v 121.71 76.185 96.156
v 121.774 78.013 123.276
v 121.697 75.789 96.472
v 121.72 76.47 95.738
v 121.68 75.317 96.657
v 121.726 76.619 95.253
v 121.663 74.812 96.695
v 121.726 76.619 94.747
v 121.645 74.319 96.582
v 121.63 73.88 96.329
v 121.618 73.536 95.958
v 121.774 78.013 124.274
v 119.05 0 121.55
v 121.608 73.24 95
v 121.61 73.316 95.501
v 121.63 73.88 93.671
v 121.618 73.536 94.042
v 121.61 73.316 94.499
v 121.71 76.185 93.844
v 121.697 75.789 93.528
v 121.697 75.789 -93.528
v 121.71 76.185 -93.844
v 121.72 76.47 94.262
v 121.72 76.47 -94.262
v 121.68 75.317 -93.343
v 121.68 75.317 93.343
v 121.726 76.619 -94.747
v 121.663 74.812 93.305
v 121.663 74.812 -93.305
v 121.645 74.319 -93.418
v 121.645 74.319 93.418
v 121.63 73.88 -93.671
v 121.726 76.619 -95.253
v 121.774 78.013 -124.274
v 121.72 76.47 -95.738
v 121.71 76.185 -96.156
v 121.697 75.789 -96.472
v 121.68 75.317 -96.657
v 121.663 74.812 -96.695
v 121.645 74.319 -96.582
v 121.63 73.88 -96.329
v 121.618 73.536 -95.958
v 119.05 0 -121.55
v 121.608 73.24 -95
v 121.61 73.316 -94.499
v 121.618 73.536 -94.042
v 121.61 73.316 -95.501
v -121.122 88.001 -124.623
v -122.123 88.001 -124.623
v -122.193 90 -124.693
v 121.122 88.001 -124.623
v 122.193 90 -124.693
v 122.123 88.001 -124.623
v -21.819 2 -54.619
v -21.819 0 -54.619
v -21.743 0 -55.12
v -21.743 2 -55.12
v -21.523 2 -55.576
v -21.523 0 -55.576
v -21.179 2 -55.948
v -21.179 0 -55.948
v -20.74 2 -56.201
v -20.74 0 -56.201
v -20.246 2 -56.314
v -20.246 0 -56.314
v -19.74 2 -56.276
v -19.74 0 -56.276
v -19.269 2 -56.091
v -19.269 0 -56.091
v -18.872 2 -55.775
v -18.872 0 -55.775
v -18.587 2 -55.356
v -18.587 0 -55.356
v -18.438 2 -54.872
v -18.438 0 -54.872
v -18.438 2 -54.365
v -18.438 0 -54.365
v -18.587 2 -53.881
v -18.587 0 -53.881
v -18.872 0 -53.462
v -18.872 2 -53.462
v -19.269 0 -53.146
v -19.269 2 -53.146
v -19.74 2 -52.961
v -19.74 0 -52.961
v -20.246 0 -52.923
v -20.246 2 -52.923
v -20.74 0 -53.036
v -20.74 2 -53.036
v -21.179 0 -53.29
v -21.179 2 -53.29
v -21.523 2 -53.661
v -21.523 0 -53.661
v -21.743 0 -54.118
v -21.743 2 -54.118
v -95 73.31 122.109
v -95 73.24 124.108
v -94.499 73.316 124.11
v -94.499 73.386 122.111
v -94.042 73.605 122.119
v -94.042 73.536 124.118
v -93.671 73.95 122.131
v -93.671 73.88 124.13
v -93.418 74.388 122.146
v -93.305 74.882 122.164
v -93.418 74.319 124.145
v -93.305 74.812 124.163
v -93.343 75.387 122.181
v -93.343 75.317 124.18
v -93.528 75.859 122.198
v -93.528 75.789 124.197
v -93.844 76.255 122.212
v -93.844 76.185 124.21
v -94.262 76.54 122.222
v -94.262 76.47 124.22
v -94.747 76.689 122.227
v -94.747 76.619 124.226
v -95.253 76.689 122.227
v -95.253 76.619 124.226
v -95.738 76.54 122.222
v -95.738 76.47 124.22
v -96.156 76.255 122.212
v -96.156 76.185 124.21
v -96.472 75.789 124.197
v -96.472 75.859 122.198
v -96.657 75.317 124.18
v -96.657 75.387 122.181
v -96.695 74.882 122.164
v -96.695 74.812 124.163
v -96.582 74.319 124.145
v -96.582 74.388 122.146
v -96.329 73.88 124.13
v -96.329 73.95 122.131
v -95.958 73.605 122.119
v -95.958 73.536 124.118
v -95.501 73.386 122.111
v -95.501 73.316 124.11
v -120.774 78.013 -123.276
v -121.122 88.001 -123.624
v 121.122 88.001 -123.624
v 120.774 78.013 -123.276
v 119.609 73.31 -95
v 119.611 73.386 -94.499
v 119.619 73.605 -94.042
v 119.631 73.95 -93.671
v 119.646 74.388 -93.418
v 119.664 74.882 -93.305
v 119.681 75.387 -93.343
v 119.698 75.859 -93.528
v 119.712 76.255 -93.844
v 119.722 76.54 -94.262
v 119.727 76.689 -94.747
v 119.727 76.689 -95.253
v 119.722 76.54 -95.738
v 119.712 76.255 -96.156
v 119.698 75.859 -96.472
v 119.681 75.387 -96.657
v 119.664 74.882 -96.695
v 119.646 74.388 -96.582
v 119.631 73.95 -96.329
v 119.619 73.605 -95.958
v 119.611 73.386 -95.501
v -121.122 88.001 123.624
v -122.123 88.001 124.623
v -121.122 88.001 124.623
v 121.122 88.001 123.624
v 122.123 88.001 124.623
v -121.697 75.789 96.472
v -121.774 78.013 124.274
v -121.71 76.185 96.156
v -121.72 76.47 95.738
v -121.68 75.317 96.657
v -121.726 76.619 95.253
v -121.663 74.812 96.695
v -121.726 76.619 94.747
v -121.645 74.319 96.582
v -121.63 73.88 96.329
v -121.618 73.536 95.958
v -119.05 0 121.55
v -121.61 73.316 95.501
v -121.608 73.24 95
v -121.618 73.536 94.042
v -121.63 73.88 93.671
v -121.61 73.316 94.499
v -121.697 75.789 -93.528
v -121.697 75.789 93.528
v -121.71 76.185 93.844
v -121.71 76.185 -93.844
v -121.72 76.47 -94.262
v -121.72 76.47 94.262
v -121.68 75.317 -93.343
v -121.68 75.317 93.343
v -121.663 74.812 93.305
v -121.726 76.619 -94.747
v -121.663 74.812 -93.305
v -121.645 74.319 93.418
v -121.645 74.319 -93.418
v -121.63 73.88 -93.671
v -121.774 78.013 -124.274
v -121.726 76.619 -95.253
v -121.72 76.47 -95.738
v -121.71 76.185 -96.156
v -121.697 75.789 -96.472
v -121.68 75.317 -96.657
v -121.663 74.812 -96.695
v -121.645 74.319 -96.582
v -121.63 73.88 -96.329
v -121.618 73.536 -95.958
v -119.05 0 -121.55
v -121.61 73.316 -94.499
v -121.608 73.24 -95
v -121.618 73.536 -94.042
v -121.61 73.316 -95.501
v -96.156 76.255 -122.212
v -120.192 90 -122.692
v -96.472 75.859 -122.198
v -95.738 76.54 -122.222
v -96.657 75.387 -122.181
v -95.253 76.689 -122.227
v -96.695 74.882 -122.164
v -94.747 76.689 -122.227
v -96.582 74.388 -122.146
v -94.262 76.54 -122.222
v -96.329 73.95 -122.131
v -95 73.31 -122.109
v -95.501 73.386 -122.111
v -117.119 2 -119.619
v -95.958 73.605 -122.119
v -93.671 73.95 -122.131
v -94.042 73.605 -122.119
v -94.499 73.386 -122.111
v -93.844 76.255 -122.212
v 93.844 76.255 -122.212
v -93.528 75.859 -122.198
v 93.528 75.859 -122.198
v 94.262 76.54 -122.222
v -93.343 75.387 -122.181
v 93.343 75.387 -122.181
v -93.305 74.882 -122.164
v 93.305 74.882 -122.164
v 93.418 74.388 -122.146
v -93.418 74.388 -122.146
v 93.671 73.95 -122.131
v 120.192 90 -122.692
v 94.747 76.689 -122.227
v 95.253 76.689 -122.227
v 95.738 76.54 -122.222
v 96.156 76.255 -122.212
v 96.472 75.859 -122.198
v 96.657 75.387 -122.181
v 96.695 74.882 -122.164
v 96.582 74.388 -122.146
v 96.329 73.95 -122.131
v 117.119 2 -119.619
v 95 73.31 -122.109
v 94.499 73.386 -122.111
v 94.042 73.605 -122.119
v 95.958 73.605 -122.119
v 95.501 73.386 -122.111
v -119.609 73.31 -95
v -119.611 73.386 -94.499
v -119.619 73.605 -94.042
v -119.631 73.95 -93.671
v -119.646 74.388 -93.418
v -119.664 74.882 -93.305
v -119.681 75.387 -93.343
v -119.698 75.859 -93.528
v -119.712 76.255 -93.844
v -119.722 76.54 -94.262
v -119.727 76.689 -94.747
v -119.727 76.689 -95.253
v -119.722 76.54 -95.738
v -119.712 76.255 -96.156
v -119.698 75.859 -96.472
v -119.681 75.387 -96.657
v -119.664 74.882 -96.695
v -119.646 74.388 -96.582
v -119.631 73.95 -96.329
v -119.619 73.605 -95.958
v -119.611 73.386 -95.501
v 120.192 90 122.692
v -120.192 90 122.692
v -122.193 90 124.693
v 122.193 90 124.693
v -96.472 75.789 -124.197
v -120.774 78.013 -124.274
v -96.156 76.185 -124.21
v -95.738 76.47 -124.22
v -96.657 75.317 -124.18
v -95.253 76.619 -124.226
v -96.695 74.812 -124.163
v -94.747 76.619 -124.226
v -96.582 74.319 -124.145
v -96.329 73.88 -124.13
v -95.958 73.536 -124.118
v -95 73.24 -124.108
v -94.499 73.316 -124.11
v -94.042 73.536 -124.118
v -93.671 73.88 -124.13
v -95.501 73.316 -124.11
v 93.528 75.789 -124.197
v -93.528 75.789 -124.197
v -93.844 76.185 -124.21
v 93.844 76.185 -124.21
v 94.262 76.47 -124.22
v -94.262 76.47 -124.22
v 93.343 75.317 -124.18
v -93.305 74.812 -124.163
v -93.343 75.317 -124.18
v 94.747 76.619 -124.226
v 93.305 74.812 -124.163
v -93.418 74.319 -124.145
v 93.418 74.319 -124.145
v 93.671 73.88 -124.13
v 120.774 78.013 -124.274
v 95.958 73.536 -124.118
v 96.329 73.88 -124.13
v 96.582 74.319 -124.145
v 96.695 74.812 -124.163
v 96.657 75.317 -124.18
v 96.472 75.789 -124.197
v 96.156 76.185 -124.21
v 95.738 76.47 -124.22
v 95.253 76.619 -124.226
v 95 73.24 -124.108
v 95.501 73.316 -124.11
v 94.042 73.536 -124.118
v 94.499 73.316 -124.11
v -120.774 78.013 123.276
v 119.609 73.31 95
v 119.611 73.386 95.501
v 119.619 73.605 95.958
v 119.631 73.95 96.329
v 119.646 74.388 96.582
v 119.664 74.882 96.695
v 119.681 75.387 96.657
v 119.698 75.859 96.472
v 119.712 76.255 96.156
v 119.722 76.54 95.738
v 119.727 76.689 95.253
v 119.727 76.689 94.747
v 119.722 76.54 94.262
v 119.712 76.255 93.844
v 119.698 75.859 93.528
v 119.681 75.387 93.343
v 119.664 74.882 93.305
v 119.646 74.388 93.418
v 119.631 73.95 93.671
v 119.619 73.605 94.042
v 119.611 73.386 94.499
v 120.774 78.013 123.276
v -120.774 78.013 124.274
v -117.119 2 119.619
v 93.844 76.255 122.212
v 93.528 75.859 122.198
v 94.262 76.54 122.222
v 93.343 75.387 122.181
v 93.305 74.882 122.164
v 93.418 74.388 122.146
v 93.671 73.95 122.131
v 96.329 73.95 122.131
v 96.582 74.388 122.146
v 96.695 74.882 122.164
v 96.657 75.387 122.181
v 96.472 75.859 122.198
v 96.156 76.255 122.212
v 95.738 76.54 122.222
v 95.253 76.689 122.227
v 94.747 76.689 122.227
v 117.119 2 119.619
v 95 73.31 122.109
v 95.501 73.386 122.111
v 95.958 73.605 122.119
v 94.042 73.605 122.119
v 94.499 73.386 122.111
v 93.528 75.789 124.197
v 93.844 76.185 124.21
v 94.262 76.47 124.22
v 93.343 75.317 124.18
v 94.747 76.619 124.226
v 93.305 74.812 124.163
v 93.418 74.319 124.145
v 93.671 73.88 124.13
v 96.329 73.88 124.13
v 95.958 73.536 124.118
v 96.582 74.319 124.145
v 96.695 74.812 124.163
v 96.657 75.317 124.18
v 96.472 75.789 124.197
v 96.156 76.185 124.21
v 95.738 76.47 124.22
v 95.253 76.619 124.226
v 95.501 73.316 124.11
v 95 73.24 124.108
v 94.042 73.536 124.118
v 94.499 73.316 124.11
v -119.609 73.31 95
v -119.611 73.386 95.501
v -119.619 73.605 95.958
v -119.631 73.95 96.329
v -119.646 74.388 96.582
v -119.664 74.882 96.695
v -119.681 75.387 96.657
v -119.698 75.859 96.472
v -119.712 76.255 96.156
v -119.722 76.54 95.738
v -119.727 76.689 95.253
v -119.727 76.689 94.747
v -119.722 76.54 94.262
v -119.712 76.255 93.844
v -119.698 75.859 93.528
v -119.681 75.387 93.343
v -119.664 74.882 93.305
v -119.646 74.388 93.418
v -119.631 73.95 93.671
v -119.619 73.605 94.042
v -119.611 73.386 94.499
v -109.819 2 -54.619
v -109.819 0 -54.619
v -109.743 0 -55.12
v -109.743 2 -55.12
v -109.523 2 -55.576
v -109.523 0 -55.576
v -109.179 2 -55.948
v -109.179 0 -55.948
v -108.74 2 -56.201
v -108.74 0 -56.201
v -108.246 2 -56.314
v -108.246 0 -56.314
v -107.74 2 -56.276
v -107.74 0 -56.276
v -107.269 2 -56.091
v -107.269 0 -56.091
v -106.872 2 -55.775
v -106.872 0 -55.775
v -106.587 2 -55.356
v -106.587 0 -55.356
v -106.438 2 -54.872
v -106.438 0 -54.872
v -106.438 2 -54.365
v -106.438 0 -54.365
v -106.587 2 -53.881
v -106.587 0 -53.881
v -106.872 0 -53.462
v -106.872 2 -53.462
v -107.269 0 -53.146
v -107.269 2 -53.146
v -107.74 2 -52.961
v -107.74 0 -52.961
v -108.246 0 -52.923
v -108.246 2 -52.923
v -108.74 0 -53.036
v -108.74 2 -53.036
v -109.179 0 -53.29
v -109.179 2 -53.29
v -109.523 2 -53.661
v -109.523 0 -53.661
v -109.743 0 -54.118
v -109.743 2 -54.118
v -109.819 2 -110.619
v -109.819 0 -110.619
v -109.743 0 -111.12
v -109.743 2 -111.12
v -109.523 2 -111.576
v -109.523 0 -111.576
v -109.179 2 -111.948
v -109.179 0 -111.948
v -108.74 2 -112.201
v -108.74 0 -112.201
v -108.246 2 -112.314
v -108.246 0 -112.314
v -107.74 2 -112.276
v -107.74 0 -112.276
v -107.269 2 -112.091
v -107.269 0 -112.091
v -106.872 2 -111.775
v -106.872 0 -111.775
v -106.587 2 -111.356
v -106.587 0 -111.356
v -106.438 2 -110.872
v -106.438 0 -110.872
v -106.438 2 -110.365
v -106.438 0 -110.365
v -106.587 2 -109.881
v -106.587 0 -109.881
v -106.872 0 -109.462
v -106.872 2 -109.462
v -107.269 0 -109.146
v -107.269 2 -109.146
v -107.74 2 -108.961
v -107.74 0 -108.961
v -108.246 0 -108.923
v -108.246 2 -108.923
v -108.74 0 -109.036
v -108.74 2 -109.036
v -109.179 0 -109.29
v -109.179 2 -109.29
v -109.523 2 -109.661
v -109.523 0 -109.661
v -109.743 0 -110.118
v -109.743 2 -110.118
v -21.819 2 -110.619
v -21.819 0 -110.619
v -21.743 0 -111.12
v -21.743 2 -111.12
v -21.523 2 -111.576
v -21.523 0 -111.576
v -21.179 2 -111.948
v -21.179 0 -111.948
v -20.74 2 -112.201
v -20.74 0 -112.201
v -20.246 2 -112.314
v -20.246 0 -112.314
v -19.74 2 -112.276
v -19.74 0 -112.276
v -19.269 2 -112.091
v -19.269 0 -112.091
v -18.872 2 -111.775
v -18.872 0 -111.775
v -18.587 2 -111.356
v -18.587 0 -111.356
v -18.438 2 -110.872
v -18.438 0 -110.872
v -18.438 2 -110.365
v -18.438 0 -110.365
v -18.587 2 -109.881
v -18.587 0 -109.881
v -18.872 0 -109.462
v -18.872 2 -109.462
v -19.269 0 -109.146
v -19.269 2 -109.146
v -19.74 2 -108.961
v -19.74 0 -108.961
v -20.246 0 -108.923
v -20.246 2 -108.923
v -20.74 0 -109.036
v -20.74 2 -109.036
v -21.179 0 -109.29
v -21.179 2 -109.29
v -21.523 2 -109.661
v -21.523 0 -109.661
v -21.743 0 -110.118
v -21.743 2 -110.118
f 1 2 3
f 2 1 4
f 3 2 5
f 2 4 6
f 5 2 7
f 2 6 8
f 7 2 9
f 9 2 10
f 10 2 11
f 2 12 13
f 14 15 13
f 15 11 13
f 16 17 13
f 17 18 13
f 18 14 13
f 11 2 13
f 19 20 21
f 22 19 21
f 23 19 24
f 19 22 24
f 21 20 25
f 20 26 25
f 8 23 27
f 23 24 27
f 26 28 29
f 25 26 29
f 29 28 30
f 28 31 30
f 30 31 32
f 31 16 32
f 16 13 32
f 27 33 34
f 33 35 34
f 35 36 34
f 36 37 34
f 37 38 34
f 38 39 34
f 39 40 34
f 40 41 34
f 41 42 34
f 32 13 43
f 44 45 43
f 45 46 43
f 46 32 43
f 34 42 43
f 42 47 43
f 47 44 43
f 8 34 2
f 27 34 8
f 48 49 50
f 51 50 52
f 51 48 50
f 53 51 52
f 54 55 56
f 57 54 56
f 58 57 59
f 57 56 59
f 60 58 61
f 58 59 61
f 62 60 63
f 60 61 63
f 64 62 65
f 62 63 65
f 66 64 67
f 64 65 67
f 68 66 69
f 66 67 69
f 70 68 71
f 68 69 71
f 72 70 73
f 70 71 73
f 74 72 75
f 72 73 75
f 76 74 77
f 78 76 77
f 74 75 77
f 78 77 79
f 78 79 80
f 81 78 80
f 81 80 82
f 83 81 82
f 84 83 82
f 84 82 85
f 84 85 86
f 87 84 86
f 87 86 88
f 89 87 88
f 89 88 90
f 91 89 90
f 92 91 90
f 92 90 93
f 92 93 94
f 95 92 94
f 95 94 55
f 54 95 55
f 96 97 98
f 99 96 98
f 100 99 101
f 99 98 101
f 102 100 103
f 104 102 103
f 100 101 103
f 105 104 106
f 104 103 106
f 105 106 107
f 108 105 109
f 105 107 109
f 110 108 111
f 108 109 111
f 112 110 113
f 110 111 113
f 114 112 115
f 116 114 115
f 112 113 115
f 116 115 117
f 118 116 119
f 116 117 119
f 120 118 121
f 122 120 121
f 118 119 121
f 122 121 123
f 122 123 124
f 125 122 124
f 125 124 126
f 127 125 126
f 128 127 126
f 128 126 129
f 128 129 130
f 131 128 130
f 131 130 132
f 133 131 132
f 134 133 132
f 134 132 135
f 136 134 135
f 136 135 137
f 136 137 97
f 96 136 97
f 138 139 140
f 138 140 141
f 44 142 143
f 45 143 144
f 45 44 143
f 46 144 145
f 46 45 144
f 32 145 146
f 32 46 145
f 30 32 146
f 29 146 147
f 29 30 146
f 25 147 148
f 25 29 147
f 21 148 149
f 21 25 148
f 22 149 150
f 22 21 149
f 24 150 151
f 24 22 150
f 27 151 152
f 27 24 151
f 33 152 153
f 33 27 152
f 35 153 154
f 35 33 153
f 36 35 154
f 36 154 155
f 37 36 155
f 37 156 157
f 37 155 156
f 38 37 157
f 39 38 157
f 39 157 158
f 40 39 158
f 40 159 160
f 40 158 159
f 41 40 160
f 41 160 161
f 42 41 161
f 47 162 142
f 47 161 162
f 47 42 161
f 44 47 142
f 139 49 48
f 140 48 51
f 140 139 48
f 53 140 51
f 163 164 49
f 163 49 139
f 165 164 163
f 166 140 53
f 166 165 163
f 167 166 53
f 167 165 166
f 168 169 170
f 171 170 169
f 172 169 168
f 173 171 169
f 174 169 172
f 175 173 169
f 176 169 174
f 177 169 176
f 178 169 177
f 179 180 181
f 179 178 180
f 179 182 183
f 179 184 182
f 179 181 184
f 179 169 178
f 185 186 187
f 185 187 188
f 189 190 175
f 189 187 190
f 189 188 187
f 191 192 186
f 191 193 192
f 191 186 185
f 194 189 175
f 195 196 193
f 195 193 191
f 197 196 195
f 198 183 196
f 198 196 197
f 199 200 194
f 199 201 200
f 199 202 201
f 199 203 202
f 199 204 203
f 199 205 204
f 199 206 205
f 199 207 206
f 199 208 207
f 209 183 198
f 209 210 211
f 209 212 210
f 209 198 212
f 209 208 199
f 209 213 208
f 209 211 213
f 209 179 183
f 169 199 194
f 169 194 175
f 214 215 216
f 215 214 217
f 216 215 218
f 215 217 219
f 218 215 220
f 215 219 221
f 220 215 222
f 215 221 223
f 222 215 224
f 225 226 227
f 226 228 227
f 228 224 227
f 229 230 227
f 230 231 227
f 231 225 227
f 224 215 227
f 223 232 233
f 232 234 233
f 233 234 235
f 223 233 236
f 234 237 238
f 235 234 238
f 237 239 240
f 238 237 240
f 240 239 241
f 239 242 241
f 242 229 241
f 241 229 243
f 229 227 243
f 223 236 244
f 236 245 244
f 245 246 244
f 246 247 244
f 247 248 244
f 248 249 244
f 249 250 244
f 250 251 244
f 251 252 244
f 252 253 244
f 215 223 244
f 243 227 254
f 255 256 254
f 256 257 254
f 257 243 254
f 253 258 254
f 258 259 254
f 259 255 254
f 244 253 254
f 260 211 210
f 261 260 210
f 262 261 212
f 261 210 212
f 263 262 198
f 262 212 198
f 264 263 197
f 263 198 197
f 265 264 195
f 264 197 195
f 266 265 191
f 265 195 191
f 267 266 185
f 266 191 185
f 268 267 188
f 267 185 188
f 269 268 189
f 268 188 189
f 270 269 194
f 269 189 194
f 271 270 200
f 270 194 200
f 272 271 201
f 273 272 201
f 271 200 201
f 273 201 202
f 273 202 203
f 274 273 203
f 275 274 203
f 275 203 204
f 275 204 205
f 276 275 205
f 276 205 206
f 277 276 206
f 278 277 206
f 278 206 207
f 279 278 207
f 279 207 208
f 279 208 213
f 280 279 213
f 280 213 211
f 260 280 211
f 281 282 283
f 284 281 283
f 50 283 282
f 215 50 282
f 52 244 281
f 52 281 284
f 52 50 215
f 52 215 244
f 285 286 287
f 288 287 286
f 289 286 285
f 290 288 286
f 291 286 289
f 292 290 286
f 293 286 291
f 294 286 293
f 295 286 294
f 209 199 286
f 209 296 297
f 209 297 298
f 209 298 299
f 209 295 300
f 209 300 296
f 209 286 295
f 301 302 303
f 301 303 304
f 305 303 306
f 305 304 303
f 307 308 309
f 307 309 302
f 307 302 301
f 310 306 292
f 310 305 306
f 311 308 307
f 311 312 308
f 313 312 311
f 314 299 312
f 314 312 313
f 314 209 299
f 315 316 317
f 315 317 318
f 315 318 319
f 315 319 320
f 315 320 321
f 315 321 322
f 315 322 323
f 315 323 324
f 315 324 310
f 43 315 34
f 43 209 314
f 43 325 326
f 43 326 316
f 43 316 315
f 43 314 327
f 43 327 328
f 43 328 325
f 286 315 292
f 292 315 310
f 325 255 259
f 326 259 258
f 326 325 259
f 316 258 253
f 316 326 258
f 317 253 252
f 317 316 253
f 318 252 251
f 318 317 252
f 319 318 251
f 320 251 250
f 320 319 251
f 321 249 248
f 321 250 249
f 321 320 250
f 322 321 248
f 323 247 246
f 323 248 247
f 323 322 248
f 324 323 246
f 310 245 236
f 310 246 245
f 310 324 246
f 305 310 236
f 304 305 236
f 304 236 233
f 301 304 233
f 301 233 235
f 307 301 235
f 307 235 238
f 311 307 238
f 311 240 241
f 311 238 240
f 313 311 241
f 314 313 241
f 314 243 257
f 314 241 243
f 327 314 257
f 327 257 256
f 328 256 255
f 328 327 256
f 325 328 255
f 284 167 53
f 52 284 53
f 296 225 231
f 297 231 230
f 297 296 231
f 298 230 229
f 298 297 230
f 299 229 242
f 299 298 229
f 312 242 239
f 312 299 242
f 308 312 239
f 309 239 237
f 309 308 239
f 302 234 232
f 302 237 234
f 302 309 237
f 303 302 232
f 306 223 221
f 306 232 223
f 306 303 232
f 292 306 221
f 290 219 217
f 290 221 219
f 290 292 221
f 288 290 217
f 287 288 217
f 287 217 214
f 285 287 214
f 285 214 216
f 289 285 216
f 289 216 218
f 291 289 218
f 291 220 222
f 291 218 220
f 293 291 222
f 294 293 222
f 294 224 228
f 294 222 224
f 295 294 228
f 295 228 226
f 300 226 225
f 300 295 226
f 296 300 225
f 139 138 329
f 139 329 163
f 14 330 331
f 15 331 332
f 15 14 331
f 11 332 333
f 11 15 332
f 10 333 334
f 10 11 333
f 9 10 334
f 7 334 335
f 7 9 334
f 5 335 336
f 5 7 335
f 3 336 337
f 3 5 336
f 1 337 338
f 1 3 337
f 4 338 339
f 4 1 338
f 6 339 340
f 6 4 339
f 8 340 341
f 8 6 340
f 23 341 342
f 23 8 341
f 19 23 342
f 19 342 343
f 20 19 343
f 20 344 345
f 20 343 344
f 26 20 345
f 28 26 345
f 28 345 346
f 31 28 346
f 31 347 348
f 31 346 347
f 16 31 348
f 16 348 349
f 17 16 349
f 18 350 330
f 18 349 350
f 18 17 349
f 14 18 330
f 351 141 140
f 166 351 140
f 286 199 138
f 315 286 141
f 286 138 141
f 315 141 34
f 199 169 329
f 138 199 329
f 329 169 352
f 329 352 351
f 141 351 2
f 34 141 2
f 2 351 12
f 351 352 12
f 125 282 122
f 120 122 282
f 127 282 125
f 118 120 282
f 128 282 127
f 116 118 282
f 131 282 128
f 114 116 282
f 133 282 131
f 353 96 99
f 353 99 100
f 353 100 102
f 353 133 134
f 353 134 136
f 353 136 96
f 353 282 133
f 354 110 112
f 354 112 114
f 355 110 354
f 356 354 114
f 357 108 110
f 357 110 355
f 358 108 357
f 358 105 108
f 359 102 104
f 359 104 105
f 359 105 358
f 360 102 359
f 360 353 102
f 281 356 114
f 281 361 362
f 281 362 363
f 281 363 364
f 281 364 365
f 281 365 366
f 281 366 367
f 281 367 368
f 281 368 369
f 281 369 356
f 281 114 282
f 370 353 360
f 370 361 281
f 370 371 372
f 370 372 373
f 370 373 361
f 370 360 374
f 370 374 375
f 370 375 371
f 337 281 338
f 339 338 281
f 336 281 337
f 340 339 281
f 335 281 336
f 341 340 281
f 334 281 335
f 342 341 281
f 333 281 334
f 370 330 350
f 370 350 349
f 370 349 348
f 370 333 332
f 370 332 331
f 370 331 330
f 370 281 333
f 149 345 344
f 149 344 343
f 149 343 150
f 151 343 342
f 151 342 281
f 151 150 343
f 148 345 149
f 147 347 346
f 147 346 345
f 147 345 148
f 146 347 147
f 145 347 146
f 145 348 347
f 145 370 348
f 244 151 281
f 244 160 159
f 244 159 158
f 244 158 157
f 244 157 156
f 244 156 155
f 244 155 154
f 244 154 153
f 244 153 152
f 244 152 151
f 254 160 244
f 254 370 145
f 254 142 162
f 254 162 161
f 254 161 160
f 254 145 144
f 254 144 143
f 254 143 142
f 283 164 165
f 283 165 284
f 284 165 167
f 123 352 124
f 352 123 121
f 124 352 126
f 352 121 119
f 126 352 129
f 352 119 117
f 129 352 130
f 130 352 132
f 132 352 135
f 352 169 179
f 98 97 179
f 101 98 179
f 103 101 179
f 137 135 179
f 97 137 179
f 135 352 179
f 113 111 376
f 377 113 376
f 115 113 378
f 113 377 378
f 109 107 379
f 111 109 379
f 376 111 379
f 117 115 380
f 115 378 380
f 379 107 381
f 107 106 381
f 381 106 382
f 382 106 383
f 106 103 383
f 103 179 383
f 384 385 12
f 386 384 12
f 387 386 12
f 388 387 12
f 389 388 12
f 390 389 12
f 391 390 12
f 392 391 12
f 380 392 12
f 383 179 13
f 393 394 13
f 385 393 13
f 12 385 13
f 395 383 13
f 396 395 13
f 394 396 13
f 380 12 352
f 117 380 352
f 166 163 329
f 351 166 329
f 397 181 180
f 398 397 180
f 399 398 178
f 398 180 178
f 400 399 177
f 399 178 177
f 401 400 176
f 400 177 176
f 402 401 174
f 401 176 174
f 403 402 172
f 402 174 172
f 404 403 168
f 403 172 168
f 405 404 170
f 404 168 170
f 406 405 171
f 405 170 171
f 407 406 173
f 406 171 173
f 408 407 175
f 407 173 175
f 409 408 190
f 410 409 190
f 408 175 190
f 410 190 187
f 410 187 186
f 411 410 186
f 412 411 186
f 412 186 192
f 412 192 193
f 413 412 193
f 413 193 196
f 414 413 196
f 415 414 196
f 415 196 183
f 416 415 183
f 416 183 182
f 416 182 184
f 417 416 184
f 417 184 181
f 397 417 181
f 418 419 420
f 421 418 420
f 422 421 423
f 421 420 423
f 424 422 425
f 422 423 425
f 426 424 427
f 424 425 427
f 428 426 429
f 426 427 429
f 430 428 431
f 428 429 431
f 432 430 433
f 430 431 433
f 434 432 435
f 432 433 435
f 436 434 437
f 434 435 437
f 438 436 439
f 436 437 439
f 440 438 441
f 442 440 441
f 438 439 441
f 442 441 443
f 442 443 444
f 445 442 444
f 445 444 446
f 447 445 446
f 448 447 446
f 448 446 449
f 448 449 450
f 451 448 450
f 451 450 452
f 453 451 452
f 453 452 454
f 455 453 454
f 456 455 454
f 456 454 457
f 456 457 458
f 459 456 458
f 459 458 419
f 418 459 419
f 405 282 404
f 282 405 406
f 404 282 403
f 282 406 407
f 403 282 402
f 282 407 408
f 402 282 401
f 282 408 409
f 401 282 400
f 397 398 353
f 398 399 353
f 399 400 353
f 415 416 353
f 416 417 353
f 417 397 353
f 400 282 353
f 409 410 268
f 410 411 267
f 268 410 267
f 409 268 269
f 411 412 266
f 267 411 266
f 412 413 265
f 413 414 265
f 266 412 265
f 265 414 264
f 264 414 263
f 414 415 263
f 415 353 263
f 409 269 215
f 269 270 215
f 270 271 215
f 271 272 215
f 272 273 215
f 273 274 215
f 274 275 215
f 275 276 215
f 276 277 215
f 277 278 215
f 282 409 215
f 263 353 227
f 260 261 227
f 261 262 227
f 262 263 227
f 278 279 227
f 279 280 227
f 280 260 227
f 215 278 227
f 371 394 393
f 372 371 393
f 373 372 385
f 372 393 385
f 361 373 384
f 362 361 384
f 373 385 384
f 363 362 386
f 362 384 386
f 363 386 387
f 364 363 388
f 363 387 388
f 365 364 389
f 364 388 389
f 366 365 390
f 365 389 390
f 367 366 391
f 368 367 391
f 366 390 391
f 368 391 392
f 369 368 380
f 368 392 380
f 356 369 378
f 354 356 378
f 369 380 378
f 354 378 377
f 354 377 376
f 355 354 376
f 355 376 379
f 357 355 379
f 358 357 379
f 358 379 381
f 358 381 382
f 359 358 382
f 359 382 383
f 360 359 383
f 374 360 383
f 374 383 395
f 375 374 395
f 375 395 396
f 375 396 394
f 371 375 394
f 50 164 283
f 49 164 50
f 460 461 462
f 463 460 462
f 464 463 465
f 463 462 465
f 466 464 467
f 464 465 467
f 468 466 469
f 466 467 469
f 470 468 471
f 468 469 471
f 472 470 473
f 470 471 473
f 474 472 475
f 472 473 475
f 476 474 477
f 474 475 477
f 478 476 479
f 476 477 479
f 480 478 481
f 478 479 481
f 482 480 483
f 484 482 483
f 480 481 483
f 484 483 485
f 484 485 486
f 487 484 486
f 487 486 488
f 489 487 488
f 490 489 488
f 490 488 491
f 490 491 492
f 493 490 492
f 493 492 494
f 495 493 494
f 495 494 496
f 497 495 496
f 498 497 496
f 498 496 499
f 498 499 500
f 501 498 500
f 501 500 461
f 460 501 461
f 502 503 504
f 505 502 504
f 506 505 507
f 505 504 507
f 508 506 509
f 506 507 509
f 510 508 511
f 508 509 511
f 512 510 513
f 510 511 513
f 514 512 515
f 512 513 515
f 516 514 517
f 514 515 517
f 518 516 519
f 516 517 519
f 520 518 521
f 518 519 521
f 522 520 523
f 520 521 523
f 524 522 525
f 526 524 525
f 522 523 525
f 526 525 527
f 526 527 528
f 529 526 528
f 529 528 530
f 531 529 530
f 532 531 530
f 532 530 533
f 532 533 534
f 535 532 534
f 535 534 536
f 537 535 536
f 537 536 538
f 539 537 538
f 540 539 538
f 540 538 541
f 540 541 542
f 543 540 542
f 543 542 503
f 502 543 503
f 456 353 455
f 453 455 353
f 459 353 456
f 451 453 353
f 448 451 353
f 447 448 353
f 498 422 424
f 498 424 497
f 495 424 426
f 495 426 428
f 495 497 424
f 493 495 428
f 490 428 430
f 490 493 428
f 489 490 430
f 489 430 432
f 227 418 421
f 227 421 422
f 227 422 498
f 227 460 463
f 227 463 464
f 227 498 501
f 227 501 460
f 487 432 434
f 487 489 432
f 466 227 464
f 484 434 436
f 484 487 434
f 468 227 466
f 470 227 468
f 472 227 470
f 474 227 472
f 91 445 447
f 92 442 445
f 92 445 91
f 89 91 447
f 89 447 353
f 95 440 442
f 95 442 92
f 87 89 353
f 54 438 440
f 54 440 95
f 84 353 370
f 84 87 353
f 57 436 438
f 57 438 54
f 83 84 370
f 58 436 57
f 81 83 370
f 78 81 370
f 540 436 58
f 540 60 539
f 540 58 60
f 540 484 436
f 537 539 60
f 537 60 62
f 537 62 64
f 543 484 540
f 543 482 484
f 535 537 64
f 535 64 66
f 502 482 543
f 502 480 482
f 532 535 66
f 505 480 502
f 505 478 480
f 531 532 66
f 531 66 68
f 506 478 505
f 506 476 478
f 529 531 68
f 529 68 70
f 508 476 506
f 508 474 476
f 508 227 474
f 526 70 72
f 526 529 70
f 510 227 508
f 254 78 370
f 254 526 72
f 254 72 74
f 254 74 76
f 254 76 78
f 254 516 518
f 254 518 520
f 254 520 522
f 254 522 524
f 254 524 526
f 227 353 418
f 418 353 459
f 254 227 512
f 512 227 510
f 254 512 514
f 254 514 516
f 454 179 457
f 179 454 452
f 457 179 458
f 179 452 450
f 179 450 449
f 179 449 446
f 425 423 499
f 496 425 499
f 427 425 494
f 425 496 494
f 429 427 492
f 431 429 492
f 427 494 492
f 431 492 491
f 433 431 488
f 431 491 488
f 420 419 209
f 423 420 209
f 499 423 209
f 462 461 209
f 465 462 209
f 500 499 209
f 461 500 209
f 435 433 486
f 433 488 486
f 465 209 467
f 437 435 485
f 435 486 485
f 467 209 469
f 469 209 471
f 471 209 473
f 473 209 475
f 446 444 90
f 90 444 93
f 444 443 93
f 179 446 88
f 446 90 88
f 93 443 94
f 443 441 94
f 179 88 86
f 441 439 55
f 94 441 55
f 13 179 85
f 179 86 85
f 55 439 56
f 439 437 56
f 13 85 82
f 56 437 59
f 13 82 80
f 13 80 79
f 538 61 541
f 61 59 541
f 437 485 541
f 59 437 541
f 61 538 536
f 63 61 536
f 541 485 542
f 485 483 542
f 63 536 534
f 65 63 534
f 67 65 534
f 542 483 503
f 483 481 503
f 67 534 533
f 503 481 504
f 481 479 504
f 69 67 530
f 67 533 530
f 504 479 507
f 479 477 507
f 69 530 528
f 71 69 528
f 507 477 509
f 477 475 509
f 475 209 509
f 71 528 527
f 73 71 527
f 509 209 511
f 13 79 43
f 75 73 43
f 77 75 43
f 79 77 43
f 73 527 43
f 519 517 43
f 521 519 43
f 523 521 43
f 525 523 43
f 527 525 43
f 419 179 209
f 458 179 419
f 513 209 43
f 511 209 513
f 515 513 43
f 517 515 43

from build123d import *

# Parameters (mm, degrees)
SKETCH1_W            = 238.1
SKETCH1_H            = 243.1
BOSS_EXTRUDE1_DEPTH  = 90
BOSS_EXTRUDE1_DRAFT  = -2
SHELL1_T             = -2
CUT_EXTRUDE7_DEPTH   = 291.651130828
CUT_EXTRUDE8_DEPTH   = 288.475472497
SKETCH10_R           = 1.7
CUT_EXTRUDE11_DEPTH  = 3
SKETCH11_R           = 1.7
CUT_EXTRUDE12_DEPTH  = 3
M3_CLEARANCE_HOLE2_D = 3.4


with BuildPart() as part:
    # Sketch1 → Boss-Extrude1 (with draft: the straight prism first)
    with BuildSketch(Plane(origin=(0, 0, 0), x_dir=(1, 0, 0), z_dir=(0, 1, 0))):
        Rectangle(SKETCH1_W, SKETCH1_H)
    extrude(amount=BOSS_EXTRUDE1_DEPTH)
    # Boss-Extrude1: the draft: its side faces are tilted about the plane it starts from
    boss_extrude1_sides = [part.faces().sort_by_distance(p)[0] for p in [
        (0, 45, 121.55),
        (119.05, 45, 0),
        (0, 45, -121.55),
        (-119.05, 45, 0),
    ]]
    draft(boss_extrude1_sides, Plane(origin=(0, 0, 0), x_dir=(1, 0, 0), z_dir=(0, 1, 0)), BOSS_EXTRUDE1_DRAFT)

    # Shell1
    shell1_openings = [part.faces().sort_by_distance(p)[0] for p in [
        (0, 90, 0),
    ]]
    offset(amount=SHELL1_T, openings=shell1_openings, kind=Kind.INTERSECTION)

    # Sketch6 → Cut-Extrude7 (cut, through all, along a direction that is not the sketch's normal)
    with BuildSketch(Plane(origin=(0, -4.239449692, 121.401955155), x_dir=(1, 0, 0), z_dir=(0, -0.03489949670250105, 0.9993908270190958))):
        Polygon((-122.123070261, 92.296892811), (-121.774287633, 82.302977128), (-120.773678831, 82.302977128), (-121.122461459, 92.296892811), align=None)
    cut_extrude7 = extrude(amount=-CUT_EXTRUDE7_DEPTH, dir=(0, 0, 1), mode=Mode.SUBTRACT)

    # Sketch7 → Cut-Extrude8 (cut, through all, along a direction that is not the sketch's normal)
    with BuildSketch(Plane(origin=(-118.905000092, -4.1522541, 0), x_dir=(0, 0, 1), z_dir=(-0.9993908270190958, -0.03489949670250105, 0))):
        Polygon((124.624288977, 92.209644069), (123.624288977, 92.209644069), (123.27550635, 82.215728386), (124.27550635, 82.215728386), align=None)
    cut_extrude8 = extrude(amount=-CUT_EXTRUDE8_DEPTH, dir=(-1, 0, 0), mode=Mode.SUBTRACT)

    # Mirror1: Cut-Extrude7 across plane
    add(cut_extrude7.mirror(Plane(origin=(0, 0, 0), x_dir=(0, 0, 1), z_dir=(1, 0, 0))), mode=Mode.SUBTRACT)

    # Mirror2: Cut-Extrude8 across plane
    add(cut_extrude8.mirror(Plane.XY), mode=Mode.SUBTRACT)

    # Sketch10 → Cut-Extrude11 (cut)
    with BuildSketch(Plane(origin=(0, -4.239449692, 121.401955155), x_dir=(1, 0, 0), z_dir=(0, -0.03489949670250105, 0.9993908270190958))):
        with Locations(Location((-95, 79.227051272, 0), (0, 0, 270))):
            Circle(SKETCH10_R)
        with Locations(Location((95, 79.227051272, 0), (0, 0, 270))):
            Circle(SKETCH10_R)
    cut_extrude11 = extrude(amount=-CUT_EXTRUDE11_DEPTH, mode=Mode.SUBTRACT)

    # Mirror3: Cut-Extrude11 across plane
    add(cut_extrude11.mirror(Plane.XY), mode=Mode.SUBTRACT)

    # Sketch11 → Cut-Extrude12 (cut)
    with BuildSketch(Plane(origin=(-118.905000092, -4.1522541, 0), x_dir=(0, 0, 1), z_dir=(-0.9993908270190958, -0.03489949670250105, 0))):
        with Locations(Location((-95, 79.13980253, 0), (0, 0, 270))):
            Circle(SKETCH11_R)
        with Locations(Location((95, 79.13980253, 0), (0, 0, 270))):
            Circle(SKETCH11_R)
    cut_extrude12 = extrude(amount=-CUT_EXTRUDE12_DEPTH, mode=Mode.SUBTRACT)

    # Mirror4: Cut-Extrude12 across plane
    add(cut_extrude12.mirror(Plane(origin=(0, 0, 0), x_dir=(0, 0, 1), z_dir=(1, 0, 0))), mode=Mode.SUBTRACT)

    # M3 Clearance Hole2 (through all)
    with Locations(Plane(origin=(0, 2, 0), x_dir=(1, 0, 0), z_dir=(0, 1, 0))):
        with Locations((-108.11862245, 54.61862245), (-108.11862245, 110.61862245), (-20.11862245, 110.61862245), (-20.11862245, 54.61862245)):
            Hole(M3_CLEARANCE_HOLE2_D / 2)


solid = part.part
